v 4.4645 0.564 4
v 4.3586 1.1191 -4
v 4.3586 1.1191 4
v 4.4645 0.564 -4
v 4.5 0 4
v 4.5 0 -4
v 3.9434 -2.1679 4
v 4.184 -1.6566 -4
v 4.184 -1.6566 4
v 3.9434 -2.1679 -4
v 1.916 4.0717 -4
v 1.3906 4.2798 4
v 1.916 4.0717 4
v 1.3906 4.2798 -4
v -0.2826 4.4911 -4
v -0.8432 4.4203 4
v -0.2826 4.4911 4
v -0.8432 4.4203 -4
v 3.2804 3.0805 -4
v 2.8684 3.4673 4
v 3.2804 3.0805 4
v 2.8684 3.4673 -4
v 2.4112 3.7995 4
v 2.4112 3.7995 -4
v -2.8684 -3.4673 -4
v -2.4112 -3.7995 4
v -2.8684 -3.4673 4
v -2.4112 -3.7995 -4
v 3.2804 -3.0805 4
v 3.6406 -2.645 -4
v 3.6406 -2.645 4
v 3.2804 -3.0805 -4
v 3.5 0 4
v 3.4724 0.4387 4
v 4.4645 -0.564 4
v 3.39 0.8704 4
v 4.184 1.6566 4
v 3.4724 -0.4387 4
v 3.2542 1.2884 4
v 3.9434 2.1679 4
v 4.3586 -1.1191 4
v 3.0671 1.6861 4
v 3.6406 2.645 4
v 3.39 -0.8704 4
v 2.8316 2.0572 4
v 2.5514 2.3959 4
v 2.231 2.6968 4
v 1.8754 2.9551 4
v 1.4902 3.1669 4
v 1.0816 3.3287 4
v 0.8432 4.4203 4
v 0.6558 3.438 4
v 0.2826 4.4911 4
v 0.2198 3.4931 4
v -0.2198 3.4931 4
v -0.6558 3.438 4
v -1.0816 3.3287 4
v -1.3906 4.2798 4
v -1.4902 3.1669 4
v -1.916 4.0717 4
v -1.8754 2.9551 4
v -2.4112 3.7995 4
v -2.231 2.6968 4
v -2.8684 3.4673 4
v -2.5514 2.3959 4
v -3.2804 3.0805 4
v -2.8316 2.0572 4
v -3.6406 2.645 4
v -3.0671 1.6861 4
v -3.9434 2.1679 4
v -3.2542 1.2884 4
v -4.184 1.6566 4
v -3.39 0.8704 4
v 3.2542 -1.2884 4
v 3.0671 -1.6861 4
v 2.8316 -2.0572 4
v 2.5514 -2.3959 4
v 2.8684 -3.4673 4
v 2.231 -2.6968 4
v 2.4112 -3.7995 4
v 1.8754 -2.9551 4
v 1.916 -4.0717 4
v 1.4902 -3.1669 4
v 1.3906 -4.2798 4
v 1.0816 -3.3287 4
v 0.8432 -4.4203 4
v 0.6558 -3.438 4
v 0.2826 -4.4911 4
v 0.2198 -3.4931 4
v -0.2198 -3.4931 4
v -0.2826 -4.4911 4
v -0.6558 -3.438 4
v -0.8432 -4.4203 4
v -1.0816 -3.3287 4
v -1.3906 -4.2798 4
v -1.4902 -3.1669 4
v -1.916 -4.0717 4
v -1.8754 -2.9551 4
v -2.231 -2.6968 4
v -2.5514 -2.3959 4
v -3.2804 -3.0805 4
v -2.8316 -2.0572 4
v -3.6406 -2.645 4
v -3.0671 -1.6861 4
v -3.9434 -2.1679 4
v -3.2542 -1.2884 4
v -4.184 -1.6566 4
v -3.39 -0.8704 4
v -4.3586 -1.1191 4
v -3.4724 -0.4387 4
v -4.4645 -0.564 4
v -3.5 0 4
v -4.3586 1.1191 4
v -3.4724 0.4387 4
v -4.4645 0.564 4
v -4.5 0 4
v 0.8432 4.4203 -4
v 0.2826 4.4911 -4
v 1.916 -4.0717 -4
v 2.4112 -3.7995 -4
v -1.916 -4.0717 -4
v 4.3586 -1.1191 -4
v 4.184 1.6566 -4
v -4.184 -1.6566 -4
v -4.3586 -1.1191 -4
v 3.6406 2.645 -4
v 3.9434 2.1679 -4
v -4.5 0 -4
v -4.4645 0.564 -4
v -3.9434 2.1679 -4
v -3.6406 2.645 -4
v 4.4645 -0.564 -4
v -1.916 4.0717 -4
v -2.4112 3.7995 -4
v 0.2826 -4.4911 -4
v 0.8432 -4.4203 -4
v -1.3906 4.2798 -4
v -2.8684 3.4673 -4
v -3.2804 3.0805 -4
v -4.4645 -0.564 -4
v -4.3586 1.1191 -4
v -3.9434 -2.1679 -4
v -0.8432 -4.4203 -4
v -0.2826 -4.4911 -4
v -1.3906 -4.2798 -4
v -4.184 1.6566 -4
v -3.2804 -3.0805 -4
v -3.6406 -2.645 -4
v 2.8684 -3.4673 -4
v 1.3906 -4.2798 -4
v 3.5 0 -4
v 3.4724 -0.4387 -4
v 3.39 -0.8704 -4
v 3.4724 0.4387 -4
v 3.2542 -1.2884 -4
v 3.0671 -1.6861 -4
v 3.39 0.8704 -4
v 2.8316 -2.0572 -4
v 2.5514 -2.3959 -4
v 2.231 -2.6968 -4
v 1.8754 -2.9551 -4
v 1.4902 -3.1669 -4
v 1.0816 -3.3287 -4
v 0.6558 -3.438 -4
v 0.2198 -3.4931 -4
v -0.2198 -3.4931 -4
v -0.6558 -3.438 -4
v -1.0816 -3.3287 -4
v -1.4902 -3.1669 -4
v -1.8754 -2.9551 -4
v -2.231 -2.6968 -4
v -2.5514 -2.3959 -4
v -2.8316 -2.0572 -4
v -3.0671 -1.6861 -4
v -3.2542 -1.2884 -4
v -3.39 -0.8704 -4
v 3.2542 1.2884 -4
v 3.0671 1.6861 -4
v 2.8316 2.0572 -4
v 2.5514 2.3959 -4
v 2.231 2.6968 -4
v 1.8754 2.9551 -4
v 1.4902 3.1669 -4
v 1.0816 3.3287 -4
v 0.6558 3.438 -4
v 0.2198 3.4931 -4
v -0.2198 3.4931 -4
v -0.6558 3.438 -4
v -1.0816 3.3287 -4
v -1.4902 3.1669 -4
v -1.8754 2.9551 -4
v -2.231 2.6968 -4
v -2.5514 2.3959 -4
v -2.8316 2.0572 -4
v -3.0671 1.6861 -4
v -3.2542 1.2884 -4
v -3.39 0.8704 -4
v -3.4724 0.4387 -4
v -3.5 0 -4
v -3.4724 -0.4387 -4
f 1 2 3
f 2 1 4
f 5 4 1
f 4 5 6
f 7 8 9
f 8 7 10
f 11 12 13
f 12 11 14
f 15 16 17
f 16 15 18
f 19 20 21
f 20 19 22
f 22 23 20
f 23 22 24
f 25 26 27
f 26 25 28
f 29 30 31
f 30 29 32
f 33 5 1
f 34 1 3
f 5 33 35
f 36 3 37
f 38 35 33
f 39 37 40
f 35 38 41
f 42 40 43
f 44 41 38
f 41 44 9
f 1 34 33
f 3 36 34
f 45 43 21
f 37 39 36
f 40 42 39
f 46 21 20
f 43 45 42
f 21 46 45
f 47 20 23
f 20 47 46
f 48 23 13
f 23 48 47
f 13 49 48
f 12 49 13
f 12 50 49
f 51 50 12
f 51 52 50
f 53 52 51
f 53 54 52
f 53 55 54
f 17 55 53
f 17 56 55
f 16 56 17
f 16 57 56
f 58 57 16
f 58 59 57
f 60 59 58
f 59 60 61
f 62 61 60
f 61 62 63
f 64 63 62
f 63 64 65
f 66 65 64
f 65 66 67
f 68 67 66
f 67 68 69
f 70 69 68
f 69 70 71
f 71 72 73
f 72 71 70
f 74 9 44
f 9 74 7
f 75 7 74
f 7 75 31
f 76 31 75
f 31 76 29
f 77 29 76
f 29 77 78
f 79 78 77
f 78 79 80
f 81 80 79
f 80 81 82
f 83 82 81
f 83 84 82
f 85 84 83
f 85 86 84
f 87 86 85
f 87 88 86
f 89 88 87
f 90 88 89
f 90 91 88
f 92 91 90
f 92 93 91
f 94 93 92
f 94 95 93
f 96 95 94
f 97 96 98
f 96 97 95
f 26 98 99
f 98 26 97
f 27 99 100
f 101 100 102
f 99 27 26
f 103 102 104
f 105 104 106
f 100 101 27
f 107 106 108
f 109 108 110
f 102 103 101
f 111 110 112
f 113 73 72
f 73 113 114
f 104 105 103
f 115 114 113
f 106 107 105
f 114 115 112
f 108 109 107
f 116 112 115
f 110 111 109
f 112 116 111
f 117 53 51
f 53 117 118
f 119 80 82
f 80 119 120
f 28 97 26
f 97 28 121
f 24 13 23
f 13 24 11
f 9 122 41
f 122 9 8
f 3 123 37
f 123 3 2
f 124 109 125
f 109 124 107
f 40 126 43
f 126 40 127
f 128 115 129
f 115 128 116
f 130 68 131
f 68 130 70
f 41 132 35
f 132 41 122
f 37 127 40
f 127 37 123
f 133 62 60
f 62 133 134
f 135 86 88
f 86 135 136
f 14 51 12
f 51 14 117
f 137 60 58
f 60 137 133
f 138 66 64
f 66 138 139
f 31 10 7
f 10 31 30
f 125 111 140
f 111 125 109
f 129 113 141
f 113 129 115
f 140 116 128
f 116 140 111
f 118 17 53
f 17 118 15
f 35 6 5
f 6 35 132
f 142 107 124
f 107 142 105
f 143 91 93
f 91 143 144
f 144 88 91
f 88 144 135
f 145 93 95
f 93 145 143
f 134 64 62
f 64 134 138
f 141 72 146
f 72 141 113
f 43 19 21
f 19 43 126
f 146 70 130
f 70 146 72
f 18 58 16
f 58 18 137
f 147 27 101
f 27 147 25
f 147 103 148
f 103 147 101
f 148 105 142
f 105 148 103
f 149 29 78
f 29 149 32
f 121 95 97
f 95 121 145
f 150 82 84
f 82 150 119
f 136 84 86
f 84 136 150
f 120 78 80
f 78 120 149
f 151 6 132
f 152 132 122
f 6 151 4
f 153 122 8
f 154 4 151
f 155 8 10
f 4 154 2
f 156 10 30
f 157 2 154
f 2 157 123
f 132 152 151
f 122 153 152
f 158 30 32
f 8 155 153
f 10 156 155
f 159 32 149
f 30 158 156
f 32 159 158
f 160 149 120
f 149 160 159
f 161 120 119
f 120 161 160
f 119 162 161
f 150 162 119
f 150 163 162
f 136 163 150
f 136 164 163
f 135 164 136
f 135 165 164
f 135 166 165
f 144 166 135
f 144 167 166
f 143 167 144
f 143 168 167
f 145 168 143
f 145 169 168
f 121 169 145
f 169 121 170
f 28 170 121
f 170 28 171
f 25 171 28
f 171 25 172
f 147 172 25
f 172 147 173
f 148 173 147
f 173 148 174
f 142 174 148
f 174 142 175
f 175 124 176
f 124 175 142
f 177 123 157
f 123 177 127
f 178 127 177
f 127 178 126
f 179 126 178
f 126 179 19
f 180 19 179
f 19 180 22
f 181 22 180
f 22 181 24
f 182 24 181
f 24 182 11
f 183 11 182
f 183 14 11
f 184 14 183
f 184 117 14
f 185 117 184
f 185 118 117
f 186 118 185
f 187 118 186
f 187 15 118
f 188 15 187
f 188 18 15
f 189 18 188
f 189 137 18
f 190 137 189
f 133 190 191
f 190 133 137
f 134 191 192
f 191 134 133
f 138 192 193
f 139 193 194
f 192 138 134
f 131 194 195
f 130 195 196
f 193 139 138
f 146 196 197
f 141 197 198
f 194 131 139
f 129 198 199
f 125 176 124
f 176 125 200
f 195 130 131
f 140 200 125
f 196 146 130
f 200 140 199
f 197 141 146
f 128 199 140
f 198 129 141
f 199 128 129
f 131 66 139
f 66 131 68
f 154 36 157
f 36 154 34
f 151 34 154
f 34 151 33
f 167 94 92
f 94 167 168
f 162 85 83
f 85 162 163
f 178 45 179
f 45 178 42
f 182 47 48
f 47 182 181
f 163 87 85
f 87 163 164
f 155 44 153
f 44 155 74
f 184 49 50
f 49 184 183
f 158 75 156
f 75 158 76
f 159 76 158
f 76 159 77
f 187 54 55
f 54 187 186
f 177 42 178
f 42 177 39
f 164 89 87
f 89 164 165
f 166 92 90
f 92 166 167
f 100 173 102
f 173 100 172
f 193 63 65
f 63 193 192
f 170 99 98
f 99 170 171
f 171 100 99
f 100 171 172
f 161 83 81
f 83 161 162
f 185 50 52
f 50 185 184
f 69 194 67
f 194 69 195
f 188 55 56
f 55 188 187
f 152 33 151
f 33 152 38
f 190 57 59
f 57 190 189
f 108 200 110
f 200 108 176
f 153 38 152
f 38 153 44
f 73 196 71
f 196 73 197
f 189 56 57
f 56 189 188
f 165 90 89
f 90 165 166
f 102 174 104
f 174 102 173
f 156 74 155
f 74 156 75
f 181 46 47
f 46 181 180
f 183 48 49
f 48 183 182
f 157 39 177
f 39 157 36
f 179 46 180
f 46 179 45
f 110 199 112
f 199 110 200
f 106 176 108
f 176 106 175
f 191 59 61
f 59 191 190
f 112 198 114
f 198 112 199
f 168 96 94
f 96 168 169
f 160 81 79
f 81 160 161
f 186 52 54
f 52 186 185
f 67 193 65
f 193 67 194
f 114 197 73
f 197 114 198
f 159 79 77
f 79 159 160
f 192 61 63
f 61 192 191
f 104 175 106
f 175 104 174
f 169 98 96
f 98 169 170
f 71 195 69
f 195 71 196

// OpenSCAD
$fn = 50;


difference() {
	union() {
		translate(v = [0, 0, -4.0000000000]) {
			cylinder(h = 8, r = 4.5000000000);
		}
	}
	union() {
		translate(v = [0, 0, -100.0000000000]) {
			cylinder(h = 200, r = 3.5000000000);
		}
	}
}
